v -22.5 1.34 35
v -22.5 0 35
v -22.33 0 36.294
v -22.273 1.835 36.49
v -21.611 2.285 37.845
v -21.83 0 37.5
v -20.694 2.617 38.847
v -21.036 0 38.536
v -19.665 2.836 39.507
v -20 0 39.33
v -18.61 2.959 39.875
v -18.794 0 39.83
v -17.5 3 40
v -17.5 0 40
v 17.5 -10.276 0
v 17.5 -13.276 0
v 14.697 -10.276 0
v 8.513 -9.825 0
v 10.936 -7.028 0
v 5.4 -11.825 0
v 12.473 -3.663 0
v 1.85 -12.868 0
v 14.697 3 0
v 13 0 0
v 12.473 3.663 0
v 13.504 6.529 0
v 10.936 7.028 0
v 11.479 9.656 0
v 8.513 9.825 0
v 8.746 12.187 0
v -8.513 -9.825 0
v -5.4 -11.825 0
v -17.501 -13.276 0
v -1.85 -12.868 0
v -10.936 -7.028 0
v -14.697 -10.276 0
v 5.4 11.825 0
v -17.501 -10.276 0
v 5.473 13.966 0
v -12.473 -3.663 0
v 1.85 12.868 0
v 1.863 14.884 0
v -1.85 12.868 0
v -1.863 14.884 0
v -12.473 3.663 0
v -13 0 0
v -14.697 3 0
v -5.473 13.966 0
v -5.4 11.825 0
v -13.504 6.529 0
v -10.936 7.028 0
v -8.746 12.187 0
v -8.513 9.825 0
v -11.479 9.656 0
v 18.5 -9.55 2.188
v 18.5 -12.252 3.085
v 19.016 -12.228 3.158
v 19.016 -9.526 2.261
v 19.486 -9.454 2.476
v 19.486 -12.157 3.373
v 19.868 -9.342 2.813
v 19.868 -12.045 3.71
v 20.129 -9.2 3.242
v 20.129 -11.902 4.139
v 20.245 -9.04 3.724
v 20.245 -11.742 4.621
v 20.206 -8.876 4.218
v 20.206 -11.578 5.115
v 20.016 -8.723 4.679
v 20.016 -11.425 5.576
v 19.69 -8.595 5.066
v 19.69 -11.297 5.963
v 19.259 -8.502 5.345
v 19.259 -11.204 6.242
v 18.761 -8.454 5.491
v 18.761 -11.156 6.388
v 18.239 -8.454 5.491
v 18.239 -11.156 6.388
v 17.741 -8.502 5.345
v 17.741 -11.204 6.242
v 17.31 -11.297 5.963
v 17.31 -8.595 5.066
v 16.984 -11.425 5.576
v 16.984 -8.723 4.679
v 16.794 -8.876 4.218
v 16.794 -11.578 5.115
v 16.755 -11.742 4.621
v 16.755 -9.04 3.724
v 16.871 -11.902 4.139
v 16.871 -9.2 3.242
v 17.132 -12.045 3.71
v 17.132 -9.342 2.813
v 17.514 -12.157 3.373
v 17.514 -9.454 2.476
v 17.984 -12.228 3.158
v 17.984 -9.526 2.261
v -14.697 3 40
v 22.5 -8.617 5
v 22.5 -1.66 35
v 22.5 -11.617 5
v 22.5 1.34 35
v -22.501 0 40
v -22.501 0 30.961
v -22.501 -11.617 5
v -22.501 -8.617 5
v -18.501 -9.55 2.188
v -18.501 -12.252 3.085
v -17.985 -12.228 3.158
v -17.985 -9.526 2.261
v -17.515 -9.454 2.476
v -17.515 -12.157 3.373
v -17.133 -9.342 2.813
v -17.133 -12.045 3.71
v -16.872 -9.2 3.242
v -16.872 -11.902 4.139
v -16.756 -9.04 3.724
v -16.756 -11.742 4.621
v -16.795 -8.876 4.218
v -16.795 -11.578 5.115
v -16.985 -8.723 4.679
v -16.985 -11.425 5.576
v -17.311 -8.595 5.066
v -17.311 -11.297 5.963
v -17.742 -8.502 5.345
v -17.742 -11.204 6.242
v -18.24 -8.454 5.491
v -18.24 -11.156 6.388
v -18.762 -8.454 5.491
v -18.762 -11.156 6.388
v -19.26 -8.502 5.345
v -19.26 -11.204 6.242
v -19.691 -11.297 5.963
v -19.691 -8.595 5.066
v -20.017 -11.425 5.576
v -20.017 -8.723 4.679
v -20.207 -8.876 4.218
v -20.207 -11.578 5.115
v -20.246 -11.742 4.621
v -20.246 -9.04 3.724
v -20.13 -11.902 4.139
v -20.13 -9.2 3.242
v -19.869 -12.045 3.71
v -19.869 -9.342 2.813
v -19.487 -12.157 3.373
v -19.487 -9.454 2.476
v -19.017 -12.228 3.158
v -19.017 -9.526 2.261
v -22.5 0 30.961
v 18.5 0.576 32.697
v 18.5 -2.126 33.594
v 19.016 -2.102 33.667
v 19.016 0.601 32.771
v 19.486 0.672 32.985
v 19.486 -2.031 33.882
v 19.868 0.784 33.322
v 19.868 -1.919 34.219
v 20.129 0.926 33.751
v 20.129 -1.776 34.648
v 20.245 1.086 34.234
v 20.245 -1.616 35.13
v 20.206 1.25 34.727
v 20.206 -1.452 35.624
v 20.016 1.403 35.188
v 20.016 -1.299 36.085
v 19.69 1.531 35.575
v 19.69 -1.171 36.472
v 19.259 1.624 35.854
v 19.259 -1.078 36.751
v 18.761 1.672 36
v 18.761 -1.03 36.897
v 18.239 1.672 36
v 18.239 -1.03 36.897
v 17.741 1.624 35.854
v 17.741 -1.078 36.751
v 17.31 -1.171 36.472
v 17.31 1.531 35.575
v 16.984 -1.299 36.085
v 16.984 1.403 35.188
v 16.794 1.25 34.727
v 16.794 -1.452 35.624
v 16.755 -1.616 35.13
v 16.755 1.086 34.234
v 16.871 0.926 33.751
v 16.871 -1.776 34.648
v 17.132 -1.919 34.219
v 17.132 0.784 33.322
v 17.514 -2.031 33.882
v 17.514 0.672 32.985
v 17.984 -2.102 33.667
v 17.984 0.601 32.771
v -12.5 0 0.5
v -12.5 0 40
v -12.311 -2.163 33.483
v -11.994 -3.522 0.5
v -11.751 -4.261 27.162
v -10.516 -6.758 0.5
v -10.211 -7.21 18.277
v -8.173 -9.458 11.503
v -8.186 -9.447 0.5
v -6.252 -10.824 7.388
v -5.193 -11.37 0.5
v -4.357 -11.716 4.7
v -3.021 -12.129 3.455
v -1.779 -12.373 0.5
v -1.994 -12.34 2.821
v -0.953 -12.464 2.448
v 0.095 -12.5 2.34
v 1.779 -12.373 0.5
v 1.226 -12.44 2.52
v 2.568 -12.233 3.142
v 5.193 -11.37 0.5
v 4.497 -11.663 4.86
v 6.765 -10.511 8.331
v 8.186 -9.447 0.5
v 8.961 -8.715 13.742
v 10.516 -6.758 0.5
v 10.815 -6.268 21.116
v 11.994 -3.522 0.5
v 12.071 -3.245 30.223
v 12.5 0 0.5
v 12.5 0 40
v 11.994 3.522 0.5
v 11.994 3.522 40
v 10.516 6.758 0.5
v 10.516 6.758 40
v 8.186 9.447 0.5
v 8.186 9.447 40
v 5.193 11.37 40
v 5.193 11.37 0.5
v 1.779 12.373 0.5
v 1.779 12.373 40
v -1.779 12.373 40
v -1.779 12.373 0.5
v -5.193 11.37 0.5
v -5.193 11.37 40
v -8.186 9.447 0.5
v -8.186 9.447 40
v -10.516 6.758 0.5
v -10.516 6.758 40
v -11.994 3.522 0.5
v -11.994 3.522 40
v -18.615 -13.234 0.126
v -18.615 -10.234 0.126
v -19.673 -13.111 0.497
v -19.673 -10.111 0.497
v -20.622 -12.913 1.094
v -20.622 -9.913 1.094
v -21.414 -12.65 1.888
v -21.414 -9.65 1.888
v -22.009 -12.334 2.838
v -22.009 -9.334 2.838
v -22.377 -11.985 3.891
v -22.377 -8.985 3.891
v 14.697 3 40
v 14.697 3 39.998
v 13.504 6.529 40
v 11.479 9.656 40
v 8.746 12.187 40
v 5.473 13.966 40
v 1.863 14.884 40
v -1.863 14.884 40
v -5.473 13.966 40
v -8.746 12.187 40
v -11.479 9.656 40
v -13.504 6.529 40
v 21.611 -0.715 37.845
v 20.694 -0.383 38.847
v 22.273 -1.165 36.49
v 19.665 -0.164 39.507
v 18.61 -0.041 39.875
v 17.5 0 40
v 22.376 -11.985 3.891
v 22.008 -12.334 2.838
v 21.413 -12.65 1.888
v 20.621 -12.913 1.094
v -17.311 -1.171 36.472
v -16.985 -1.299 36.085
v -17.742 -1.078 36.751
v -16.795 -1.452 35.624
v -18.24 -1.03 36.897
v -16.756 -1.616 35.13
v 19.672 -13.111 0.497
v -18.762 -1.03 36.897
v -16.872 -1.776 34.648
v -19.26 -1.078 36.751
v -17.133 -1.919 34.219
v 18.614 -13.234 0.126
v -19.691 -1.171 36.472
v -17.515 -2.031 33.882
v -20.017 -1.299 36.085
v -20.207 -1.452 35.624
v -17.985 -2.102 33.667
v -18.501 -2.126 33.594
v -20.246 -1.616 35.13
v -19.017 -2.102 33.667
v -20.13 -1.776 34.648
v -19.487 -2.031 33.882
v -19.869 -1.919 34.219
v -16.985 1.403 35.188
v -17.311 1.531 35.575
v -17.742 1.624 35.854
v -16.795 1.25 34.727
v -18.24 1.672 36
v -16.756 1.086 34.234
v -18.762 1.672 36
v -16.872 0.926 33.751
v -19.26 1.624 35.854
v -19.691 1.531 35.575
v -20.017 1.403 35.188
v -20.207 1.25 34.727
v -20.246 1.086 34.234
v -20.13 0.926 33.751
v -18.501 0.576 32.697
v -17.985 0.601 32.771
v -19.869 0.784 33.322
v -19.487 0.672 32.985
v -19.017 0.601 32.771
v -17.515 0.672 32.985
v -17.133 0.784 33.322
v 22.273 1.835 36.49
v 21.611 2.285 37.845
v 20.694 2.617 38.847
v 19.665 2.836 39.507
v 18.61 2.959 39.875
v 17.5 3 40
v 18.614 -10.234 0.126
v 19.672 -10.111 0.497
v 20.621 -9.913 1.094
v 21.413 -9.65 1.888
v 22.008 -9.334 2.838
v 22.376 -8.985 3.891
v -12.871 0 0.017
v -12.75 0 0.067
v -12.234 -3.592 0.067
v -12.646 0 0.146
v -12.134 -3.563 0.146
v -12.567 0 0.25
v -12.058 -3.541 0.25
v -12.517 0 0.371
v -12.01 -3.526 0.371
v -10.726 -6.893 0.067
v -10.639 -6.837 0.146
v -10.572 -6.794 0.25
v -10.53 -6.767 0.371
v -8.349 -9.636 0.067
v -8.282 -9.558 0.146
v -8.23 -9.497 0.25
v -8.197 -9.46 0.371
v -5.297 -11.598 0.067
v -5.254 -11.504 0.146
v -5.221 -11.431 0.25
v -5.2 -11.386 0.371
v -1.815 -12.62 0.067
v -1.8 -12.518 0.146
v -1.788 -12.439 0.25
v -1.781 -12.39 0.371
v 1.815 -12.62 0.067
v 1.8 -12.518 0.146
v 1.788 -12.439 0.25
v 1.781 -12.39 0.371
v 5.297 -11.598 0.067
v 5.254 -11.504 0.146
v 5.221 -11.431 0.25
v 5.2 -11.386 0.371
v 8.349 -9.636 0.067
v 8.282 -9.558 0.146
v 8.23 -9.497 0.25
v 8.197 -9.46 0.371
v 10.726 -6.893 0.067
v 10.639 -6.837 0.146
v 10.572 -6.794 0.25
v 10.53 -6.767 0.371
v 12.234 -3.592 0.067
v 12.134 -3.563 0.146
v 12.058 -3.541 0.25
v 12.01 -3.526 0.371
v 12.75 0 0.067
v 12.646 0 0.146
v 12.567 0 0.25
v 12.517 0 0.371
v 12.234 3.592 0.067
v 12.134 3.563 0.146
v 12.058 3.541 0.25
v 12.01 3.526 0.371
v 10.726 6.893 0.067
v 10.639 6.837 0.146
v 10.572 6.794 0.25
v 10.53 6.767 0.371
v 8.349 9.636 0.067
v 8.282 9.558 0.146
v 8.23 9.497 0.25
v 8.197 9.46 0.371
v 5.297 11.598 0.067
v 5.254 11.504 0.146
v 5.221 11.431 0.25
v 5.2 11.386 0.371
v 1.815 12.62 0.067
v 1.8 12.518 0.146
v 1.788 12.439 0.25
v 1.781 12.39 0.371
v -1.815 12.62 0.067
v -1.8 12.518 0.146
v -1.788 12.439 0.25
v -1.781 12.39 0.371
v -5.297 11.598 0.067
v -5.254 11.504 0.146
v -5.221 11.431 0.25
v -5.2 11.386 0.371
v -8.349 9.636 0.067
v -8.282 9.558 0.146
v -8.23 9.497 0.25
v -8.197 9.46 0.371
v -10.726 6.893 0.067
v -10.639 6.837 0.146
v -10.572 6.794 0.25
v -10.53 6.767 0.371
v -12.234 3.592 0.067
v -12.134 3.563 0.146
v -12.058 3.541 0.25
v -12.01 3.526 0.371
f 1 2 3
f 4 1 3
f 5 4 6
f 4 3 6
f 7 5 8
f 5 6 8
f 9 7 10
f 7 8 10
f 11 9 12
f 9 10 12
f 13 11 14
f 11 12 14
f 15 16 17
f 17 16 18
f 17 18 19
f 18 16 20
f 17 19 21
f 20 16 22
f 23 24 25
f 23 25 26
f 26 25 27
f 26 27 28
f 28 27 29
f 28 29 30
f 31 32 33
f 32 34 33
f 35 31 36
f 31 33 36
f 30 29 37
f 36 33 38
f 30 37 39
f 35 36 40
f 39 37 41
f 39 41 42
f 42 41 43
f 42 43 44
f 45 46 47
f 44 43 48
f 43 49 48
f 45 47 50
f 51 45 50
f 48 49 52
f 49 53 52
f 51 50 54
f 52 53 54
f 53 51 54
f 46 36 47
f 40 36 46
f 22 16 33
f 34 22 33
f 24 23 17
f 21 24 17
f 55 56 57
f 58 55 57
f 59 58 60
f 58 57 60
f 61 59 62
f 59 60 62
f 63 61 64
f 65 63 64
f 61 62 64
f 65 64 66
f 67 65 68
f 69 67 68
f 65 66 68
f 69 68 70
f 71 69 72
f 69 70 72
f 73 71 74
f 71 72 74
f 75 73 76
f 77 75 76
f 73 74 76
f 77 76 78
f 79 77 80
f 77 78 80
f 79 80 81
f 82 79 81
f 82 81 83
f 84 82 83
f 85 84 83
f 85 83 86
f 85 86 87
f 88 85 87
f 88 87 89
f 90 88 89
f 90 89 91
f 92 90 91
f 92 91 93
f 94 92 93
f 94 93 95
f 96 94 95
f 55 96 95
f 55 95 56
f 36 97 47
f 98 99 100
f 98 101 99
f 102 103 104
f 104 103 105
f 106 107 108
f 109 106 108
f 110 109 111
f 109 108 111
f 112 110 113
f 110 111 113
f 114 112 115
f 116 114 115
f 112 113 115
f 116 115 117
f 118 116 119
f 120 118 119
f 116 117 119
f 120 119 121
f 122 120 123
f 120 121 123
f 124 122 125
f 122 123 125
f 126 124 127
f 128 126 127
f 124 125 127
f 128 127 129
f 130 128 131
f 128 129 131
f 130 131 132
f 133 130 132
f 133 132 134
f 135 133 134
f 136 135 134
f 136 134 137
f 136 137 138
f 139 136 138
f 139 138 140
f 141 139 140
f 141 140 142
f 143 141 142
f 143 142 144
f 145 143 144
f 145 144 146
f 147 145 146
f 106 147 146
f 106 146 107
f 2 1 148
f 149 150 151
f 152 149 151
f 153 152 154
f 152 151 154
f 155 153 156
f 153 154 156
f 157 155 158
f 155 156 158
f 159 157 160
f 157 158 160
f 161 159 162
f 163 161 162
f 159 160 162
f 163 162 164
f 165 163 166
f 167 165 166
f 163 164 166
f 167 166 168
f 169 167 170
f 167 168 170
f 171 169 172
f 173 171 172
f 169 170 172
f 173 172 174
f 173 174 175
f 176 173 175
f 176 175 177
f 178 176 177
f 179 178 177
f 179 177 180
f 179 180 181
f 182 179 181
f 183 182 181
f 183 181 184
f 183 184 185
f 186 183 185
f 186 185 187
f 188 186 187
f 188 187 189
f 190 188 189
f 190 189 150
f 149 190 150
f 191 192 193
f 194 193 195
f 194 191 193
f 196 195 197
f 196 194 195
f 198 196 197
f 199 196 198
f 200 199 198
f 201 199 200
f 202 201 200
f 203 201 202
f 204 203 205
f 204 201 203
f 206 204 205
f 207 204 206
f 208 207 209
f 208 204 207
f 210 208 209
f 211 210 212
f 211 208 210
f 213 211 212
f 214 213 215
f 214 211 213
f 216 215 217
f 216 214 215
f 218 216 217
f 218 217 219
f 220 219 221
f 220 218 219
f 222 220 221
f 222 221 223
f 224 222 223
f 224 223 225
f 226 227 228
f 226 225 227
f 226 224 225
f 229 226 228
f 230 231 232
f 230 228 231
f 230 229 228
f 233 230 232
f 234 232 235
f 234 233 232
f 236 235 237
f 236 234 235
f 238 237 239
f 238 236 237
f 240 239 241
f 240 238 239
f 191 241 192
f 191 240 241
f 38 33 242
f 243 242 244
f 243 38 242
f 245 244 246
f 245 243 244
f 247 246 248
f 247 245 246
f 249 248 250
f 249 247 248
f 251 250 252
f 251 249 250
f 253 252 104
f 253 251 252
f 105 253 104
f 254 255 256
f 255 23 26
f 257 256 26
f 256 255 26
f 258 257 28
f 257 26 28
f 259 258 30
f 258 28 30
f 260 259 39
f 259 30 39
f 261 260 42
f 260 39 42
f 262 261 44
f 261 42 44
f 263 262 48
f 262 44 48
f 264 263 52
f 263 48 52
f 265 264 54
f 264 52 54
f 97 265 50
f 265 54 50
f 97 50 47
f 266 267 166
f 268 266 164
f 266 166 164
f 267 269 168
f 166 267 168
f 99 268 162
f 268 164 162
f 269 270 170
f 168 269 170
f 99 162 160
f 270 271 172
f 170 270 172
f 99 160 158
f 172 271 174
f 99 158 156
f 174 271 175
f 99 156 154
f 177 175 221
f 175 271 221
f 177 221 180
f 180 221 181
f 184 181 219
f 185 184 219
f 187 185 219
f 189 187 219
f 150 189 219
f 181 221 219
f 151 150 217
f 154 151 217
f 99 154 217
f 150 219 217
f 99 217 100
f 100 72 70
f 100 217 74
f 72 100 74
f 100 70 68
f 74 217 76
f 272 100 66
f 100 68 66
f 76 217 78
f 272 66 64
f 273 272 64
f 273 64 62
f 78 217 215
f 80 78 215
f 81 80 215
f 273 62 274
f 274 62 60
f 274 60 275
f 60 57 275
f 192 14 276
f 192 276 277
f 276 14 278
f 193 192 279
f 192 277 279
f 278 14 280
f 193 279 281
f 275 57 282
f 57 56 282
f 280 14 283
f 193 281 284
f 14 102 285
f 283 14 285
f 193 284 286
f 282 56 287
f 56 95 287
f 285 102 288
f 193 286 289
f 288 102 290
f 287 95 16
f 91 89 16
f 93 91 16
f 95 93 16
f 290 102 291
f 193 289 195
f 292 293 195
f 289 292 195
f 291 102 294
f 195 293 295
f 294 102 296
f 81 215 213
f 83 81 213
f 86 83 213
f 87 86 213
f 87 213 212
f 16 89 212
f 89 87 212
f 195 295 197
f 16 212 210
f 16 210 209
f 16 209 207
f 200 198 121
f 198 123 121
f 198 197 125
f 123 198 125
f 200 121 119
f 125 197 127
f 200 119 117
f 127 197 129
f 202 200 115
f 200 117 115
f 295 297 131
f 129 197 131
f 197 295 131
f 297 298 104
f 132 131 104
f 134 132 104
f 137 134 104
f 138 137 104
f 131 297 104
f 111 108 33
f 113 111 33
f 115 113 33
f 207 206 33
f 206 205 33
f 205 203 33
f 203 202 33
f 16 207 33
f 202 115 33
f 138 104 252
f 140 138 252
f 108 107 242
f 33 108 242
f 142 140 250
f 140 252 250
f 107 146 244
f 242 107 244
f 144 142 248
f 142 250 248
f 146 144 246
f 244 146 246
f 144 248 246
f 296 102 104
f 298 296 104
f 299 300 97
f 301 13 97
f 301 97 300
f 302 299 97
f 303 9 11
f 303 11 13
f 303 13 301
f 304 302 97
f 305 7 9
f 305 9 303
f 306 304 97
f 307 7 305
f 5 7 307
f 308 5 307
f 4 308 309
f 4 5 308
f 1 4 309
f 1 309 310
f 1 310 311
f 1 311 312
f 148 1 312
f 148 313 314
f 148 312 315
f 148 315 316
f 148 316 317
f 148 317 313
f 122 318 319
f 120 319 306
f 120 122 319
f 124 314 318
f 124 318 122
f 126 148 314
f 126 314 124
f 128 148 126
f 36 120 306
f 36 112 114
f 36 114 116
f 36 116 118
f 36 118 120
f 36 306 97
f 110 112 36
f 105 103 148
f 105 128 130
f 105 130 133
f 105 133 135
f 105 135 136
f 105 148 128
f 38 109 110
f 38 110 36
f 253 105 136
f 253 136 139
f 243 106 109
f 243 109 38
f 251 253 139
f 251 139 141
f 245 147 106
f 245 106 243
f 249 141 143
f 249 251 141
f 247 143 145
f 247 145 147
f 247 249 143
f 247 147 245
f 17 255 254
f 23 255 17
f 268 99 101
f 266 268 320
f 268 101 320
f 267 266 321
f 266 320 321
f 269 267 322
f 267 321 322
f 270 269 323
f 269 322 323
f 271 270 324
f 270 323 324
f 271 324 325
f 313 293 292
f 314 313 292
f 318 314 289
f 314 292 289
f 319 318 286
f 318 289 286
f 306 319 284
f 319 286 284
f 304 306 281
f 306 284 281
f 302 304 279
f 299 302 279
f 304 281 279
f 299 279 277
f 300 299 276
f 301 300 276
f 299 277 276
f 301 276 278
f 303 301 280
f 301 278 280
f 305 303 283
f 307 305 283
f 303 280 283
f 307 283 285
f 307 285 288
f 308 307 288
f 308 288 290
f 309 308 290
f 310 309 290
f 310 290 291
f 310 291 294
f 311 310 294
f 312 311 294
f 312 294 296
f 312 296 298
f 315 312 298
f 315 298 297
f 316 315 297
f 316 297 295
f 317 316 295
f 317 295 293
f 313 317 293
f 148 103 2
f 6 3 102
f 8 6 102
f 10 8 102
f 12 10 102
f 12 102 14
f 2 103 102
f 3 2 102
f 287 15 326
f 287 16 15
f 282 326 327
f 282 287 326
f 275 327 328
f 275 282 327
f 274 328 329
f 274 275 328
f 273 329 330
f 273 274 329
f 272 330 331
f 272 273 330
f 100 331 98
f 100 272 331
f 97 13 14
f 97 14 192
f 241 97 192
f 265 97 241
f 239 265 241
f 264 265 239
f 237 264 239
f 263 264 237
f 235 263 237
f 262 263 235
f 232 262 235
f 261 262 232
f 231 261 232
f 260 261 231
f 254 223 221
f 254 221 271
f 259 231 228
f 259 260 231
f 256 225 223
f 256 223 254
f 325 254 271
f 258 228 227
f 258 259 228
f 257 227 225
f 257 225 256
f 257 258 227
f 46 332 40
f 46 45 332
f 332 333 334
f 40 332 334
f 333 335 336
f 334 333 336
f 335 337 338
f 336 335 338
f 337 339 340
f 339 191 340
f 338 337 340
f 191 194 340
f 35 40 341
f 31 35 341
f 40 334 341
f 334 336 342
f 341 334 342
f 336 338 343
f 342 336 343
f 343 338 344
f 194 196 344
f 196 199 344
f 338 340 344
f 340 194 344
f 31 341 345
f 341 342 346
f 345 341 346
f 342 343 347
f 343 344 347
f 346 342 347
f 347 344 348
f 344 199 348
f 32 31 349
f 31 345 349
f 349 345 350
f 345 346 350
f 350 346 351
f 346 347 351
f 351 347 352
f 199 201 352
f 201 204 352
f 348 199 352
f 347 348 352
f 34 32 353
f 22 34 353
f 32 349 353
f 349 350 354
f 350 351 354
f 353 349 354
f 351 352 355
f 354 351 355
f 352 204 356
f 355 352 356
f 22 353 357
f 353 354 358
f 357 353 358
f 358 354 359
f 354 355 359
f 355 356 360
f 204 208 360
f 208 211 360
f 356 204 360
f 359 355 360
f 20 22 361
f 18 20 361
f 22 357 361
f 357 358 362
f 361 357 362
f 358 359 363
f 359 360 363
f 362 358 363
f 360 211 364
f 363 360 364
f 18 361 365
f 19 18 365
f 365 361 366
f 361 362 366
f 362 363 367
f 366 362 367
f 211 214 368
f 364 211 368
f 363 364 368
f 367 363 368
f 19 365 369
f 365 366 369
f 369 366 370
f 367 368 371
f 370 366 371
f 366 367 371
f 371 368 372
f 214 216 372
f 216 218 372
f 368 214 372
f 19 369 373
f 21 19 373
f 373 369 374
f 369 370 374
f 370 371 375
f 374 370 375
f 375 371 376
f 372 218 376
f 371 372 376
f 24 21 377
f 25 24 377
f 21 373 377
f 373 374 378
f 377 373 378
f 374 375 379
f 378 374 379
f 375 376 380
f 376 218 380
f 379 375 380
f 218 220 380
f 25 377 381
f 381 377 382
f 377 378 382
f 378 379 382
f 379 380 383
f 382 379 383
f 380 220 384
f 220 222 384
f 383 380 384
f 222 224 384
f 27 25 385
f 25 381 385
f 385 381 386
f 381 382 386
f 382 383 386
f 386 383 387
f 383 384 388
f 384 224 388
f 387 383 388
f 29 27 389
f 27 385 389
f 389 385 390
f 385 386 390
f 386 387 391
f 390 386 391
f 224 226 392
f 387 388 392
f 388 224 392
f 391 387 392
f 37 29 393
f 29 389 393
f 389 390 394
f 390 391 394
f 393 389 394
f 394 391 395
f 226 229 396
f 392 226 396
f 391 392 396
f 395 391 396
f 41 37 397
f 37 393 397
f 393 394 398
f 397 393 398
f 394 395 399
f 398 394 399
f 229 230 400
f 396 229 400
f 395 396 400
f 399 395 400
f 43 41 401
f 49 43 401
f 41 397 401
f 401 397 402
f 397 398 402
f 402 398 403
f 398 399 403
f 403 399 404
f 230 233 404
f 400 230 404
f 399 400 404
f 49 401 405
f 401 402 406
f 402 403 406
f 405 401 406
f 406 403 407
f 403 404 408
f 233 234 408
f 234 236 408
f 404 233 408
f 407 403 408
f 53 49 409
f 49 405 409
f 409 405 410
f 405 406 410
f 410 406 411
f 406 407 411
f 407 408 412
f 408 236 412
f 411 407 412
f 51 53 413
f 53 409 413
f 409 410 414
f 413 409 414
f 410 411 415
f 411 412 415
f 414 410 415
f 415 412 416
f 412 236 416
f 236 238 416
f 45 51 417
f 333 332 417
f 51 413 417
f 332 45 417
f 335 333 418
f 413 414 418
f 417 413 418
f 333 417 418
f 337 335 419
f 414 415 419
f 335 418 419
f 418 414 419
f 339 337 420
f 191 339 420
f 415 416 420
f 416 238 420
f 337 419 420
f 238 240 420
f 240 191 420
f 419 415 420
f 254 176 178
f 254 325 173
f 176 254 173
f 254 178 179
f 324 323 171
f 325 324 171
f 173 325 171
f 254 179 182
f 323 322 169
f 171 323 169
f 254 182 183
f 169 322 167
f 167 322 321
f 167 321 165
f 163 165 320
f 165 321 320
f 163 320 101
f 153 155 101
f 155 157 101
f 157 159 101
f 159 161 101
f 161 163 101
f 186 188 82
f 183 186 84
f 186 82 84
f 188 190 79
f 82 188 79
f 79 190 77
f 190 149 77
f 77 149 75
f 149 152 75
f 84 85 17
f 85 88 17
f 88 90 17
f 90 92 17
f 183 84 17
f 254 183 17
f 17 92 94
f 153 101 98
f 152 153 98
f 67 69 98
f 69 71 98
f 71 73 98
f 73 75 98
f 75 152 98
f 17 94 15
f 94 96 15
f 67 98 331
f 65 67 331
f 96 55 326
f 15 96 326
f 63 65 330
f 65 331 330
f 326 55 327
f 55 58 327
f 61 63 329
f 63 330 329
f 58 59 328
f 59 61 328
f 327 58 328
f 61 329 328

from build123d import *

# Parameters (mm, degrees)
EXTRUDE_1_DEPTH     = 40
EXTRUDE_START       = -45.001
EXTRUDE_2_DEPTH     = 45.001
EXTRUDE_2_2_DEPTH   = 41
SKETCH_4_R          = 1.75
CUT_EXTRUDE_1_DEPTH = 51.311943761
CUT_EXTRUDE_2_DEPTH = 7.803062
CUT_EXTRUDE_3_DEPTH = 7.804062
FILLET_6_R          = 5
FILLET_7_R          = 0.5


with BuildPart() as part:
    # ｽｹｯﾁ1 → ﾎﾞｽ - 押し出し1 (new body)
    with BuildSketch(Plane.XY):
        with BuildLine():
            Line((-14.696938457, 3), (-22.5, 3))
            Line((-22.5, 3), (-22.5, 0))
            Line((-22.5, 0), (-12.5, 0))
            ThreePointArc((-12.5, 0), (0, 12.5), (12.5, 0))
            Line((12.5, 0), (22.5, 0))
            Line((22.5, 0), (22.5, 3))
            Line((22.5, 3), (14.696938457, 3))
            ThreePointArc((14.696938457, 3), (0, 15), (-14.696938457, 3))
        make_face()
    extrude(amount=EXTRUDE_1_DEPTH)

    # ﾎﾞｽ - 押し出し2: read off the stored shape, not the designer's step
    # ﾎﾞｽ - 押し出し2 outline → ﾎﾞｽ - 押し出し2 (add)
    with BuildSketch(Plane(origin=(22.5, 0, 0), x_dir=(0, 0, -1), z_dir=(1, 0, 0)).offset(EXTRUDE_START)):
        Polygon((0, -13.276129684), (0, 0), (-40, 0), align=None)
    extrude(amount=EXTRUDE_2_DEPTH)

    # Extrude 2 2 outline → Extrude 2 2 (cut)
    with BuildSketch(Plane.XY):
        with BuildLine():
            ThreePointArc((-12.5, 0), (0, -12.5), (12.5, 0))
            Line((12.5, 0), (-12.5, 0))
        make_face()
    extrude(amount=EXTRUDE_2_2_DEPTH, mode=Mode.SUBTRACT)

    # ｽｹｯﾁ4 → ｶｯﾄ - 押し出し1 (cut, through all)
    with BuildSketch(Plane(origin=(0, -11.958755971, 3.969149878), x_dir=(-1, 0, 0), z_dir=(0, -0.9490896970518627, 0.31500594748354094))):
        with Locations(Location((18.501, -32.963587882, 0), (0, 0, 90))):
            Circle(SKETCH_4_R)
        with Locations(Location((18.501, -0.81794019, 0), (0, 0, 90))):
            Circle(SKETCH_4_R)
        with Locations(Location((-18.5, -32.963587882, 0), (0, 0, 90))):
            Circle(SKETCH_4_R)
        with Locations(Location((-18.5, -0.81794019, 0), (0, 0, 90))):
            Circle(SKETCH_4_R)
    extrude(amount=-CUT_EXTRUDE_1_DEPTH, mode=Mode.SUBTRACT)

    # ｽｹｯﾁ5 → ｶｯﾄ - 押し出し2 (cut)
    with BuildSketch(Plane(origin=(22.5, 0, 0), x_dir=(0, 0, -1), z_dir=(1, 0, 0))):
        Polygon((-40, 3), (0, -10.276129684), (0, 3.043212606), align=None)
    extrude(amount=-CUT_EXTRUDE_2_DEPTH, mode=Mode.SUBTRACT)

    # ｽｹｯﾁ7 → ｶｯﾄ - 押し出し3 (cut)
    with BuildSketch(Plane.ZY.offset(22.501)):
        Polygon((0, 3), (40, 3), (0, -10.276129684), align=None)
    extrude(amount=-CUT_EXTRUDE_3_DEPTH, mode=Mode.SUBTRACT)

    # ﾌｨﾚｯﾄ6
    fillet_6_edges = [part.edges().sort_by_distance(p)[0] for p in [
        (22.5, -11.776129684, 0),
        (22.5, 1.5, 40),
        (-22.5, 1.5, 40),
        (-22.501, -11.776129684, 0),
    ]]
    fillet(fillet_6_edges, radius=FILLET_6_R)

    # ﾌｨﾚｯﾄ7
    fillet_7_edges = [part.edges().sort_by_distance(p)[0] for p in [
        (12.5, 0, 0),
    ]]
    fillet(fillet_7_edges, radius=FILLET_7_R)


solid = part.part
